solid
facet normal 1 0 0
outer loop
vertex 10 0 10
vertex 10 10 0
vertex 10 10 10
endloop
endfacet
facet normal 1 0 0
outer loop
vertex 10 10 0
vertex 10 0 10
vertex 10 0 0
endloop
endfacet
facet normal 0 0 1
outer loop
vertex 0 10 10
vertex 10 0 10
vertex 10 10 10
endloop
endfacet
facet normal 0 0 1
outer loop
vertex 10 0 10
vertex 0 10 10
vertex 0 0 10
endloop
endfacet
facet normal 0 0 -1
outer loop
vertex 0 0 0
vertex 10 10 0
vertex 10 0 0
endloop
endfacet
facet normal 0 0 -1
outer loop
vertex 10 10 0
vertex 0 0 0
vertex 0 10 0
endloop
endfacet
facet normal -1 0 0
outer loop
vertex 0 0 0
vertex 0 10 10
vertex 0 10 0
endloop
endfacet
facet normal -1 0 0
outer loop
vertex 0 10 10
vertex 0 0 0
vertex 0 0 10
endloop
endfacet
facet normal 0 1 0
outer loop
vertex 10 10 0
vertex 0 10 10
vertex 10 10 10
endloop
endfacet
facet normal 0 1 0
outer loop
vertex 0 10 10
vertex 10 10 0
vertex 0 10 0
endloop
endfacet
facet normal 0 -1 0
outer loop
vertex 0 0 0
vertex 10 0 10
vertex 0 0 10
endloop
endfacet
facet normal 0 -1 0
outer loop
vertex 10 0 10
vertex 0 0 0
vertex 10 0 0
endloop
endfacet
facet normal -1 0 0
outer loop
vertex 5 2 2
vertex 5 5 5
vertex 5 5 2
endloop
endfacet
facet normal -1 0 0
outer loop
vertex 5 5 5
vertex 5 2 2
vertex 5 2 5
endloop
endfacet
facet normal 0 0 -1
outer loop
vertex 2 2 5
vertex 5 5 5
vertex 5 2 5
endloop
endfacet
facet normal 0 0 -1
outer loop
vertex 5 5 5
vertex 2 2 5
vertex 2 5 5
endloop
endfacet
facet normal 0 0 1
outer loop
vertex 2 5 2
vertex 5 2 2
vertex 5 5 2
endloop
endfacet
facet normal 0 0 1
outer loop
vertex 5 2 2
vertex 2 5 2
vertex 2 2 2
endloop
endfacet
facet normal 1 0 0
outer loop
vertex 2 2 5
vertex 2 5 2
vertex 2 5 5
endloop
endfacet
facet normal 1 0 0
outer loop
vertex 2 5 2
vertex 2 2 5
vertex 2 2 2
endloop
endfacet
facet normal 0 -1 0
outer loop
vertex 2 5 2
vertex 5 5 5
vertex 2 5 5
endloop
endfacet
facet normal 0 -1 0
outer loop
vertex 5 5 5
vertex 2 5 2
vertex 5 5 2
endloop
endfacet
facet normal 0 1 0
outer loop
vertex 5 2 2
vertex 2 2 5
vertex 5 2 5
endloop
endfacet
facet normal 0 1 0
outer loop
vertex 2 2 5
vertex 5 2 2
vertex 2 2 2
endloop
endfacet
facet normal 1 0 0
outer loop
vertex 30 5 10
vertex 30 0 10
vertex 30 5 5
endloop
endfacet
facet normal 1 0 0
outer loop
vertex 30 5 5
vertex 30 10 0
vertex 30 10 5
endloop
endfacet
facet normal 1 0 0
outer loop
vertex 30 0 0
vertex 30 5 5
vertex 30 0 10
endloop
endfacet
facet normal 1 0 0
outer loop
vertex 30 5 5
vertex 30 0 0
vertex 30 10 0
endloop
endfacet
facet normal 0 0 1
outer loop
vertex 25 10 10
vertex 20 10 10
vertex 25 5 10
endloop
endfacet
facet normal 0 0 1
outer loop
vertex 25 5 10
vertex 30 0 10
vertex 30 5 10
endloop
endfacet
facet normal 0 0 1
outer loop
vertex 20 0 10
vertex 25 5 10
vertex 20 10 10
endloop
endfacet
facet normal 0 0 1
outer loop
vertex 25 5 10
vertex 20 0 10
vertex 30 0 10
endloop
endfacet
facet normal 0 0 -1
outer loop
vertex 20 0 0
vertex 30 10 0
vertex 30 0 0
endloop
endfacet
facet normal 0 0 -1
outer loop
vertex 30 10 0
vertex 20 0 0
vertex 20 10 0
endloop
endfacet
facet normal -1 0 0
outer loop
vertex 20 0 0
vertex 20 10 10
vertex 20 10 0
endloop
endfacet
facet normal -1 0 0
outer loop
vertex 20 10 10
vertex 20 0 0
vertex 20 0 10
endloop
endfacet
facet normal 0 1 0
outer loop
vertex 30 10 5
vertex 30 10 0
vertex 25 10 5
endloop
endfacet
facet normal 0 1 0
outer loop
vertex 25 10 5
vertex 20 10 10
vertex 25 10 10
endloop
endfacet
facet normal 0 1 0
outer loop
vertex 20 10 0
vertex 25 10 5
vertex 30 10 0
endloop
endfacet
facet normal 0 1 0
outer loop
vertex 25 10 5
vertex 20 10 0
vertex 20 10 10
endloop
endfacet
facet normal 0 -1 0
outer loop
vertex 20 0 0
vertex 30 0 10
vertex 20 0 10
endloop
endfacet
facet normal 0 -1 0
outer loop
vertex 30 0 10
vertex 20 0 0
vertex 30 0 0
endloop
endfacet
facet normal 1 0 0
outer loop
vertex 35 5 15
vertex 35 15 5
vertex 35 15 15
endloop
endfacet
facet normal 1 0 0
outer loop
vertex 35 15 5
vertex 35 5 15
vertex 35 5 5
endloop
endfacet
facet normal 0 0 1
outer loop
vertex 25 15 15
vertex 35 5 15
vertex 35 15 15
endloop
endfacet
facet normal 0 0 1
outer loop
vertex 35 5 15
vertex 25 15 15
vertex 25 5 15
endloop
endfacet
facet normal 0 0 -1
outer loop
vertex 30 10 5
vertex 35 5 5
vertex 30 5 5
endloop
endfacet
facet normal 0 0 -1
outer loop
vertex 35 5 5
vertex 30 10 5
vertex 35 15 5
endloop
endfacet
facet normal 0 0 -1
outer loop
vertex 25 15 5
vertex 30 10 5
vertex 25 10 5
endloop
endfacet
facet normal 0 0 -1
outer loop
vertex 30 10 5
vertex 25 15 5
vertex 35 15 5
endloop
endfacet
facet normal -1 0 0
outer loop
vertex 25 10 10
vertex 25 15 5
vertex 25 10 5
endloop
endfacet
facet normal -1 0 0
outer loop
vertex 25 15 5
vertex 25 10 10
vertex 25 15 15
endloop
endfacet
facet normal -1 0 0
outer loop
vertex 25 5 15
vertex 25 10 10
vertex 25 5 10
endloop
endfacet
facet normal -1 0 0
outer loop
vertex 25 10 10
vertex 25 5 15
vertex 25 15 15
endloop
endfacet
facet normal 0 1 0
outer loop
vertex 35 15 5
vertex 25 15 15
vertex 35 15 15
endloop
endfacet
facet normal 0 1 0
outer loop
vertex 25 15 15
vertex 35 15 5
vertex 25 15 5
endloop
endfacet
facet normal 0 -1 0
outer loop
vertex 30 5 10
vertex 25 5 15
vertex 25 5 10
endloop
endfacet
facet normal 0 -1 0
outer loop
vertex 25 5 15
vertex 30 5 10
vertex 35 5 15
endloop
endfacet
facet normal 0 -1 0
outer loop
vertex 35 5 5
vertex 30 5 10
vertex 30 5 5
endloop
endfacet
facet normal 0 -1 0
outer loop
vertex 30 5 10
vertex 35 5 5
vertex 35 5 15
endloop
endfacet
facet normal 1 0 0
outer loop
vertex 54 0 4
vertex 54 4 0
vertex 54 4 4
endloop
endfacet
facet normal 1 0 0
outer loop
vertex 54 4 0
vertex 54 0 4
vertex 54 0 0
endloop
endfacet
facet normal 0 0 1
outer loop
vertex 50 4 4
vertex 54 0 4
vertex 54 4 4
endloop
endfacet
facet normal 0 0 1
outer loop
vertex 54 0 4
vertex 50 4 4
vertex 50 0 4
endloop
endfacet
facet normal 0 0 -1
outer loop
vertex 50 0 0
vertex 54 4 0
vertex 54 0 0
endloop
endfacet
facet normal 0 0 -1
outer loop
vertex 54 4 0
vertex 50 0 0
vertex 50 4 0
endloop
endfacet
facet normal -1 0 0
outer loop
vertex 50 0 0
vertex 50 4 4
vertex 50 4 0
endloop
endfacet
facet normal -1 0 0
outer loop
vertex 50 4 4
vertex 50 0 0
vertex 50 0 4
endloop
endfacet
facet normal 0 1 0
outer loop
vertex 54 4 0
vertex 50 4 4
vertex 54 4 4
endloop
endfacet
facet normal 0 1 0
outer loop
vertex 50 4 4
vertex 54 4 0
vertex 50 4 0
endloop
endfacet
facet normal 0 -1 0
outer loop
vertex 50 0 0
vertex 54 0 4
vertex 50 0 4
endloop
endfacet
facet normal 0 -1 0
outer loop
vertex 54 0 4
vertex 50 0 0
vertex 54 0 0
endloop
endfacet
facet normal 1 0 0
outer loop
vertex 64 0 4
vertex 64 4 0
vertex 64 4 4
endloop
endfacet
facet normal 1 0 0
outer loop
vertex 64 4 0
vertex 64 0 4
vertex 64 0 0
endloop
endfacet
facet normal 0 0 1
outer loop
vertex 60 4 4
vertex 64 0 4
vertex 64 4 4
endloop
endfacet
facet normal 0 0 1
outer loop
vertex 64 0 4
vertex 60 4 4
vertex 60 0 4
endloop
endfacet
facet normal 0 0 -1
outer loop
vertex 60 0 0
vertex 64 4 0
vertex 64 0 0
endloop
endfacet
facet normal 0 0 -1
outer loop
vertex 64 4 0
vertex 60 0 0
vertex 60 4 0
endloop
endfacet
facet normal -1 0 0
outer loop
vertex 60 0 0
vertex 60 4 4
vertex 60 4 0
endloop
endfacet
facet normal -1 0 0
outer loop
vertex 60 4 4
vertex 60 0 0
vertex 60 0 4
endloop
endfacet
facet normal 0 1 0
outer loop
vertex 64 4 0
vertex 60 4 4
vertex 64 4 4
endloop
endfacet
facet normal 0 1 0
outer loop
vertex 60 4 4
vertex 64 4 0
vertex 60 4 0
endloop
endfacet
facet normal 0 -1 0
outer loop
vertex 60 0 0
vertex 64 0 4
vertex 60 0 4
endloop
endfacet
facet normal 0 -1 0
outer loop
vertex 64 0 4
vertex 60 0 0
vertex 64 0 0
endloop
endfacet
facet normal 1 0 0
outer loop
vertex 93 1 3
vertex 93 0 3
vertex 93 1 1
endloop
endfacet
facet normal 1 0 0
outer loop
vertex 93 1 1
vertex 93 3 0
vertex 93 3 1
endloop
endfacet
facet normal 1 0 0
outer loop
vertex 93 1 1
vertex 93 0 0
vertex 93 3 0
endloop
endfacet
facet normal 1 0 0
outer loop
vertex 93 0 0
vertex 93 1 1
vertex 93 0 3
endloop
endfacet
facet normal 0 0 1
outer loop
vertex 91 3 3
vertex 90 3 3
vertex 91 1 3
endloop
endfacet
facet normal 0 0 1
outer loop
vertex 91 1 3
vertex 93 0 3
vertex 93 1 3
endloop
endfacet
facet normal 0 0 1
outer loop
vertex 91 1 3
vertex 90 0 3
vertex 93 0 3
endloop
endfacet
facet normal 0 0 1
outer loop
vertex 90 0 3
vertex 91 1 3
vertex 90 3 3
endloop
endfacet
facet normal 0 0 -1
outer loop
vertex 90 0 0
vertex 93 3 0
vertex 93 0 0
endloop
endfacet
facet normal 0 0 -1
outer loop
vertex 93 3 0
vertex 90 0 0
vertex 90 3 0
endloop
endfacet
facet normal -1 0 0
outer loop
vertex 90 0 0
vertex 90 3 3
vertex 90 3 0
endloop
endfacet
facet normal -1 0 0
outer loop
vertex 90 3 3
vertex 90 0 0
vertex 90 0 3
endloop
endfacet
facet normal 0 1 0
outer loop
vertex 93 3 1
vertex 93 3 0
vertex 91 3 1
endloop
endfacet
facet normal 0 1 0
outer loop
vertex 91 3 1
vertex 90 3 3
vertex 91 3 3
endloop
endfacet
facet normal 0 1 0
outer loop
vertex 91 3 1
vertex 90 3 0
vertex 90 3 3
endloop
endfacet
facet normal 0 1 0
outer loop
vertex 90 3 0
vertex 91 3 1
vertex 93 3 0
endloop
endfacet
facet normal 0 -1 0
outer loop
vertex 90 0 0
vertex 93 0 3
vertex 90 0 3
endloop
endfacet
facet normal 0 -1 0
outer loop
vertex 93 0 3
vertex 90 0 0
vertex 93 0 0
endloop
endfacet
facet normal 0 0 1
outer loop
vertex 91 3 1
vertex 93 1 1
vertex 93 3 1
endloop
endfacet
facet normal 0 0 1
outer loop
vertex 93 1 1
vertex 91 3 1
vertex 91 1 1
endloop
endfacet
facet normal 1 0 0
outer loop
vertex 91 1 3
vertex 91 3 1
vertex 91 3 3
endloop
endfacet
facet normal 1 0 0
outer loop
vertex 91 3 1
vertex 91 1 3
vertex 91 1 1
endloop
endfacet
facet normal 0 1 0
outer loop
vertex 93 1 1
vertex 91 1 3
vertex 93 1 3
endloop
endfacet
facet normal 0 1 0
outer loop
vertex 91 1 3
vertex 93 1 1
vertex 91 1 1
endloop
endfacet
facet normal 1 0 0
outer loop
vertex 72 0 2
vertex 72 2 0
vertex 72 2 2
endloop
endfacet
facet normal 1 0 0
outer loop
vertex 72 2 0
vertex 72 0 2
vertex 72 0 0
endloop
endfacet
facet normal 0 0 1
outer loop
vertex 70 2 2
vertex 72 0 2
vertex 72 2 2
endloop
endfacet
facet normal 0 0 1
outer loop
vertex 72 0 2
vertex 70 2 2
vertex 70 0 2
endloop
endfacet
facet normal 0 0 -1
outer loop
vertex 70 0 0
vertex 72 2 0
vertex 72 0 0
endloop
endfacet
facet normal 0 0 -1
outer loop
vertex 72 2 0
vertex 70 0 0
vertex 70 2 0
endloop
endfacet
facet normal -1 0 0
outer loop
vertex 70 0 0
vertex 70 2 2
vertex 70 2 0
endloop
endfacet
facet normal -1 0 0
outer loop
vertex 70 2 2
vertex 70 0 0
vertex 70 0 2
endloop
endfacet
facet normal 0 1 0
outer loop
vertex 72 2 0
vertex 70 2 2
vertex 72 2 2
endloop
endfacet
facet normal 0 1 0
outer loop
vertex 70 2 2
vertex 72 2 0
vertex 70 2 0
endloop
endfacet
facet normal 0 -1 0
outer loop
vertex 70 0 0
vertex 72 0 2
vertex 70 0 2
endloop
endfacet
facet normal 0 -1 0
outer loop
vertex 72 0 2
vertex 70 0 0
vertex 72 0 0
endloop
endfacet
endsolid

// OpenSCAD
// colour-booleans.scad — how colour survives boolean and nesting rules.
// Top-level solids, in order (the colour a Part is made from):
//   solid-0  red difference, 10^3 with a 3^3 pocket     = 973   red   (color() above the difference)
//   solid-1  union of two overlapping blue cubes        = 1875  blue  (every operand shared it)
//   solid-2  } union of a red and a blue cube           = 64 each, NO colour: a union of
//   solid-3  } differently coloured children is not blended (a warning says so)
//   solid-4  red cube inside a green group              = 8     red   (the INNERMOST color() wins)
//   solid-5  difference whose minuend is red            = 19    red   (OpenSCAD keeps the first child's colour)
color("red") difference() { cube(10); translate([2, 2, 2]) cube(3); }
translate([20, 0, 0]) color("blue") union() { cube(10); translate([5, 5, 5]) cube(10); }
translate([50, 0, 0]) union() { color("red") cube(4); translate([10, 0, 0]) color("blue") cube(4); }
translate([70, 0, 0]) color("green") { color("red") cube(2); }
translate([90, 0, 0]) difference() { color("red") cube(3); translate([1, 1, 1]) cube(3); }
